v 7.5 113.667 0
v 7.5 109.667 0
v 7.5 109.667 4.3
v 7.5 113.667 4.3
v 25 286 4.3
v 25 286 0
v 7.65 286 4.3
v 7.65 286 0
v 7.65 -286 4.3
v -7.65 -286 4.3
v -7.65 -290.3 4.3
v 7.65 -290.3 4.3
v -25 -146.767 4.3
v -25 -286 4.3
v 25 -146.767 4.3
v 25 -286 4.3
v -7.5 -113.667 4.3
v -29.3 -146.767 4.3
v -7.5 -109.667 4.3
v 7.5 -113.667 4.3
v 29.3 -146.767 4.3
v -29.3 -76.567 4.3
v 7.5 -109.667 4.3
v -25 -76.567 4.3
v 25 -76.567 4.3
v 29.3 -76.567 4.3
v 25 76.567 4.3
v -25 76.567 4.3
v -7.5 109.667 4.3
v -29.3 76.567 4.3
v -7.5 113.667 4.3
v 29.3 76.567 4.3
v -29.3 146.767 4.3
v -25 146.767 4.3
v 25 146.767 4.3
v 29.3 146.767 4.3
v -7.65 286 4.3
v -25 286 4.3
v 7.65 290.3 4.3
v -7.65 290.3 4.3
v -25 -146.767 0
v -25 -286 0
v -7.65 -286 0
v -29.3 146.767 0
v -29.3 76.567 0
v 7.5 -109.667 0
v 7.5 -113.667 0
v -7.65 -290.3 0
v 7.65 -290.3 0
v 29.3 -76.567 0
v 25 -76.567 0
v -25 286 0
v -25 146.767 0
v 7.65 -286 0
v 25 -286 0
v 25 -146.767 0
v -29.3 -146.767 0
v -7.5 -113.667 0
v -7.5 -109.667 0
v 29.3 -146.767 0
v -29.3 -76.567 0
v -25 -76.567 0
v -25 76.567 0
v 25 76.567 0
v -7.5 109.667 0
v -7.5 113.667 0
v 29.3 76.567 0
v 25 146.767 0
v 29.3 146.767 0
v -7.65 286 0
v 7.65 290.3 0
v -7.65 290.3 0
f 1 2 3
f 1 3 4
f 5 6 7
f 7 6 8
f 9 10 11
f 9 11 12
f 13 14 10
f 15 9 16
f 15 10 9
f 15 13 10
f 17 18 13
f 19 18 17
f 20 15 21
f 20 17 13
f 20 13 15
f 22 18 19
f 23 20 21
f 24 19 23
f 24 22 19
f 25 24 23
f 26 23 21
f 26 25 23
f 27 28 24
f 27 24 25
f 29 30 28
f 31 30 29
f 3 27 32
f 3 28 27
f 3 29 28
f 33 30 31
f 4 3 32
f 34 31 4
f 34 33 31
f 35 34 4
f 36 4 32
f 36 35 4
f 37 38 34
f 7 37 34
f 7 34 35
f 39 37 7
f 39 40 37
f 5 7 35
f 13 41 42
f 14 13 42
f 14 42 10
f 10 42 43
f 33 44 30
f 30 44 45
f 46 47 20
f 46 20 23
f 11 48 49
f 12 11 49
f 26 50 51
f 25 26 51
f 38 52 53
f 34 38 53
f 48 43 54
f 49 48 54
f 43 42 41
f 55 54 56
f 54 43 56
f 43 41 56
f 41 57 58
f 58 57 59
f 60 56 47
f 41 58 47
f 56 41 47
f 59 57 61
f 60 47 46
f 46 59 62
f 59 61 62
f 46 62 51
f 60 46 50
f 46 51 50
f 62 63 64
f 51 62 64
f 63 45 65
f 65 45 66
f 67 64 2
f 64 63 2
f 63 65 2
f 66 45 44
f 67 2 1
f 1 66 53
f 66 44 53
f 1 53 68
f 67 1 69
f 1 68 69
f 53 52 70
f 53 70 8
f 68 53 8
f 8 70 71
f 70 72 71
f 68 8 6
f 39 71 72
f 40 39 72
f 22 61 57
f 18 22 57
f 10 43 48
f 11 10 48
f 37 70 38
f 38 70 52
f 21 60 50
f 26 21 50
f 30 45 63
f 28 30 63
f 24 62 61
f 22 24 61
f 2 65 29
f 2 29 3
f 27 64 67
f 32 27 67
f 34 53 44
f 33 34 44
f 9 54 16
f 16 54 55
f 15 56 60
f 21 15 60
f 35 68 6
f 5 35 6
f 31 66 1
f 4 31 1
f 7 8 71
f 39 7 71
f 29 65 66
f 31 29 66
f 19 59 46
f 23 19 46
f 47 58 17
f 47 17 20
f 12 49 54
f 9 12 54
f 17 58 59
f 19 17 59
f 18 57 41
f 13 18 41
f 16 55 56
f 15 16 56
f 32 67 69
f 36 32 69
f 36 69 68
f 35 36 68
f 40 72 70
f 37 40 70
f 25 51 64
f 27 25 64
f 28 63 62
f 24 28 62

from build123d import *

# Parameters (mm, degrees)
SKETCH2_W           = 15
SKETCH2_H           = 4
BOSS_EXTRUDE1_DEPTH = 4.3


with BuildPart() as part:
    # Sketch2 → Boss-Extrude1 (new body)
    with BuildSketch(Plane.XY):
        Polygon((-25, -286), (-7.65, -286), (-7.65, -290.3), (7.65, -290.3), (7.65, -286), (25, -286), (25, -146.7666), (29.3, -146.7666), (29.3, -76.5666), (25, -76.5666), (25, 76.5667), (29.3, 76.5667), (29.3, 146.7667), (25, 146.7667), (25, 286), (7.65, 286), (7.65, 290.3), (-7.65, 290.3), (-7.65, 286), (-25, 286), (-25, 146.7667), (-29.3, 146.7667), (-29.3, 76.5667), (-25, 76.5667), (-25, -76.5666), (-29.3, -76.5666), (-29.3, -146.7666), (-25, -146.7666), align=None)
        with Locations((0, 111.6666)):
            Rectangle(SKETCH2_W, SKETCH2_H, mode=Mode.SUBTRACT)
        with Locations((0, -111.6666)):
            Rectangle(SKETCH2_W, SKETCH2_H, mode=Mode.SUBTRACT)
    extrude(amount=BOSS_EXTRUDE1_DEPTH)


solid = part.part
